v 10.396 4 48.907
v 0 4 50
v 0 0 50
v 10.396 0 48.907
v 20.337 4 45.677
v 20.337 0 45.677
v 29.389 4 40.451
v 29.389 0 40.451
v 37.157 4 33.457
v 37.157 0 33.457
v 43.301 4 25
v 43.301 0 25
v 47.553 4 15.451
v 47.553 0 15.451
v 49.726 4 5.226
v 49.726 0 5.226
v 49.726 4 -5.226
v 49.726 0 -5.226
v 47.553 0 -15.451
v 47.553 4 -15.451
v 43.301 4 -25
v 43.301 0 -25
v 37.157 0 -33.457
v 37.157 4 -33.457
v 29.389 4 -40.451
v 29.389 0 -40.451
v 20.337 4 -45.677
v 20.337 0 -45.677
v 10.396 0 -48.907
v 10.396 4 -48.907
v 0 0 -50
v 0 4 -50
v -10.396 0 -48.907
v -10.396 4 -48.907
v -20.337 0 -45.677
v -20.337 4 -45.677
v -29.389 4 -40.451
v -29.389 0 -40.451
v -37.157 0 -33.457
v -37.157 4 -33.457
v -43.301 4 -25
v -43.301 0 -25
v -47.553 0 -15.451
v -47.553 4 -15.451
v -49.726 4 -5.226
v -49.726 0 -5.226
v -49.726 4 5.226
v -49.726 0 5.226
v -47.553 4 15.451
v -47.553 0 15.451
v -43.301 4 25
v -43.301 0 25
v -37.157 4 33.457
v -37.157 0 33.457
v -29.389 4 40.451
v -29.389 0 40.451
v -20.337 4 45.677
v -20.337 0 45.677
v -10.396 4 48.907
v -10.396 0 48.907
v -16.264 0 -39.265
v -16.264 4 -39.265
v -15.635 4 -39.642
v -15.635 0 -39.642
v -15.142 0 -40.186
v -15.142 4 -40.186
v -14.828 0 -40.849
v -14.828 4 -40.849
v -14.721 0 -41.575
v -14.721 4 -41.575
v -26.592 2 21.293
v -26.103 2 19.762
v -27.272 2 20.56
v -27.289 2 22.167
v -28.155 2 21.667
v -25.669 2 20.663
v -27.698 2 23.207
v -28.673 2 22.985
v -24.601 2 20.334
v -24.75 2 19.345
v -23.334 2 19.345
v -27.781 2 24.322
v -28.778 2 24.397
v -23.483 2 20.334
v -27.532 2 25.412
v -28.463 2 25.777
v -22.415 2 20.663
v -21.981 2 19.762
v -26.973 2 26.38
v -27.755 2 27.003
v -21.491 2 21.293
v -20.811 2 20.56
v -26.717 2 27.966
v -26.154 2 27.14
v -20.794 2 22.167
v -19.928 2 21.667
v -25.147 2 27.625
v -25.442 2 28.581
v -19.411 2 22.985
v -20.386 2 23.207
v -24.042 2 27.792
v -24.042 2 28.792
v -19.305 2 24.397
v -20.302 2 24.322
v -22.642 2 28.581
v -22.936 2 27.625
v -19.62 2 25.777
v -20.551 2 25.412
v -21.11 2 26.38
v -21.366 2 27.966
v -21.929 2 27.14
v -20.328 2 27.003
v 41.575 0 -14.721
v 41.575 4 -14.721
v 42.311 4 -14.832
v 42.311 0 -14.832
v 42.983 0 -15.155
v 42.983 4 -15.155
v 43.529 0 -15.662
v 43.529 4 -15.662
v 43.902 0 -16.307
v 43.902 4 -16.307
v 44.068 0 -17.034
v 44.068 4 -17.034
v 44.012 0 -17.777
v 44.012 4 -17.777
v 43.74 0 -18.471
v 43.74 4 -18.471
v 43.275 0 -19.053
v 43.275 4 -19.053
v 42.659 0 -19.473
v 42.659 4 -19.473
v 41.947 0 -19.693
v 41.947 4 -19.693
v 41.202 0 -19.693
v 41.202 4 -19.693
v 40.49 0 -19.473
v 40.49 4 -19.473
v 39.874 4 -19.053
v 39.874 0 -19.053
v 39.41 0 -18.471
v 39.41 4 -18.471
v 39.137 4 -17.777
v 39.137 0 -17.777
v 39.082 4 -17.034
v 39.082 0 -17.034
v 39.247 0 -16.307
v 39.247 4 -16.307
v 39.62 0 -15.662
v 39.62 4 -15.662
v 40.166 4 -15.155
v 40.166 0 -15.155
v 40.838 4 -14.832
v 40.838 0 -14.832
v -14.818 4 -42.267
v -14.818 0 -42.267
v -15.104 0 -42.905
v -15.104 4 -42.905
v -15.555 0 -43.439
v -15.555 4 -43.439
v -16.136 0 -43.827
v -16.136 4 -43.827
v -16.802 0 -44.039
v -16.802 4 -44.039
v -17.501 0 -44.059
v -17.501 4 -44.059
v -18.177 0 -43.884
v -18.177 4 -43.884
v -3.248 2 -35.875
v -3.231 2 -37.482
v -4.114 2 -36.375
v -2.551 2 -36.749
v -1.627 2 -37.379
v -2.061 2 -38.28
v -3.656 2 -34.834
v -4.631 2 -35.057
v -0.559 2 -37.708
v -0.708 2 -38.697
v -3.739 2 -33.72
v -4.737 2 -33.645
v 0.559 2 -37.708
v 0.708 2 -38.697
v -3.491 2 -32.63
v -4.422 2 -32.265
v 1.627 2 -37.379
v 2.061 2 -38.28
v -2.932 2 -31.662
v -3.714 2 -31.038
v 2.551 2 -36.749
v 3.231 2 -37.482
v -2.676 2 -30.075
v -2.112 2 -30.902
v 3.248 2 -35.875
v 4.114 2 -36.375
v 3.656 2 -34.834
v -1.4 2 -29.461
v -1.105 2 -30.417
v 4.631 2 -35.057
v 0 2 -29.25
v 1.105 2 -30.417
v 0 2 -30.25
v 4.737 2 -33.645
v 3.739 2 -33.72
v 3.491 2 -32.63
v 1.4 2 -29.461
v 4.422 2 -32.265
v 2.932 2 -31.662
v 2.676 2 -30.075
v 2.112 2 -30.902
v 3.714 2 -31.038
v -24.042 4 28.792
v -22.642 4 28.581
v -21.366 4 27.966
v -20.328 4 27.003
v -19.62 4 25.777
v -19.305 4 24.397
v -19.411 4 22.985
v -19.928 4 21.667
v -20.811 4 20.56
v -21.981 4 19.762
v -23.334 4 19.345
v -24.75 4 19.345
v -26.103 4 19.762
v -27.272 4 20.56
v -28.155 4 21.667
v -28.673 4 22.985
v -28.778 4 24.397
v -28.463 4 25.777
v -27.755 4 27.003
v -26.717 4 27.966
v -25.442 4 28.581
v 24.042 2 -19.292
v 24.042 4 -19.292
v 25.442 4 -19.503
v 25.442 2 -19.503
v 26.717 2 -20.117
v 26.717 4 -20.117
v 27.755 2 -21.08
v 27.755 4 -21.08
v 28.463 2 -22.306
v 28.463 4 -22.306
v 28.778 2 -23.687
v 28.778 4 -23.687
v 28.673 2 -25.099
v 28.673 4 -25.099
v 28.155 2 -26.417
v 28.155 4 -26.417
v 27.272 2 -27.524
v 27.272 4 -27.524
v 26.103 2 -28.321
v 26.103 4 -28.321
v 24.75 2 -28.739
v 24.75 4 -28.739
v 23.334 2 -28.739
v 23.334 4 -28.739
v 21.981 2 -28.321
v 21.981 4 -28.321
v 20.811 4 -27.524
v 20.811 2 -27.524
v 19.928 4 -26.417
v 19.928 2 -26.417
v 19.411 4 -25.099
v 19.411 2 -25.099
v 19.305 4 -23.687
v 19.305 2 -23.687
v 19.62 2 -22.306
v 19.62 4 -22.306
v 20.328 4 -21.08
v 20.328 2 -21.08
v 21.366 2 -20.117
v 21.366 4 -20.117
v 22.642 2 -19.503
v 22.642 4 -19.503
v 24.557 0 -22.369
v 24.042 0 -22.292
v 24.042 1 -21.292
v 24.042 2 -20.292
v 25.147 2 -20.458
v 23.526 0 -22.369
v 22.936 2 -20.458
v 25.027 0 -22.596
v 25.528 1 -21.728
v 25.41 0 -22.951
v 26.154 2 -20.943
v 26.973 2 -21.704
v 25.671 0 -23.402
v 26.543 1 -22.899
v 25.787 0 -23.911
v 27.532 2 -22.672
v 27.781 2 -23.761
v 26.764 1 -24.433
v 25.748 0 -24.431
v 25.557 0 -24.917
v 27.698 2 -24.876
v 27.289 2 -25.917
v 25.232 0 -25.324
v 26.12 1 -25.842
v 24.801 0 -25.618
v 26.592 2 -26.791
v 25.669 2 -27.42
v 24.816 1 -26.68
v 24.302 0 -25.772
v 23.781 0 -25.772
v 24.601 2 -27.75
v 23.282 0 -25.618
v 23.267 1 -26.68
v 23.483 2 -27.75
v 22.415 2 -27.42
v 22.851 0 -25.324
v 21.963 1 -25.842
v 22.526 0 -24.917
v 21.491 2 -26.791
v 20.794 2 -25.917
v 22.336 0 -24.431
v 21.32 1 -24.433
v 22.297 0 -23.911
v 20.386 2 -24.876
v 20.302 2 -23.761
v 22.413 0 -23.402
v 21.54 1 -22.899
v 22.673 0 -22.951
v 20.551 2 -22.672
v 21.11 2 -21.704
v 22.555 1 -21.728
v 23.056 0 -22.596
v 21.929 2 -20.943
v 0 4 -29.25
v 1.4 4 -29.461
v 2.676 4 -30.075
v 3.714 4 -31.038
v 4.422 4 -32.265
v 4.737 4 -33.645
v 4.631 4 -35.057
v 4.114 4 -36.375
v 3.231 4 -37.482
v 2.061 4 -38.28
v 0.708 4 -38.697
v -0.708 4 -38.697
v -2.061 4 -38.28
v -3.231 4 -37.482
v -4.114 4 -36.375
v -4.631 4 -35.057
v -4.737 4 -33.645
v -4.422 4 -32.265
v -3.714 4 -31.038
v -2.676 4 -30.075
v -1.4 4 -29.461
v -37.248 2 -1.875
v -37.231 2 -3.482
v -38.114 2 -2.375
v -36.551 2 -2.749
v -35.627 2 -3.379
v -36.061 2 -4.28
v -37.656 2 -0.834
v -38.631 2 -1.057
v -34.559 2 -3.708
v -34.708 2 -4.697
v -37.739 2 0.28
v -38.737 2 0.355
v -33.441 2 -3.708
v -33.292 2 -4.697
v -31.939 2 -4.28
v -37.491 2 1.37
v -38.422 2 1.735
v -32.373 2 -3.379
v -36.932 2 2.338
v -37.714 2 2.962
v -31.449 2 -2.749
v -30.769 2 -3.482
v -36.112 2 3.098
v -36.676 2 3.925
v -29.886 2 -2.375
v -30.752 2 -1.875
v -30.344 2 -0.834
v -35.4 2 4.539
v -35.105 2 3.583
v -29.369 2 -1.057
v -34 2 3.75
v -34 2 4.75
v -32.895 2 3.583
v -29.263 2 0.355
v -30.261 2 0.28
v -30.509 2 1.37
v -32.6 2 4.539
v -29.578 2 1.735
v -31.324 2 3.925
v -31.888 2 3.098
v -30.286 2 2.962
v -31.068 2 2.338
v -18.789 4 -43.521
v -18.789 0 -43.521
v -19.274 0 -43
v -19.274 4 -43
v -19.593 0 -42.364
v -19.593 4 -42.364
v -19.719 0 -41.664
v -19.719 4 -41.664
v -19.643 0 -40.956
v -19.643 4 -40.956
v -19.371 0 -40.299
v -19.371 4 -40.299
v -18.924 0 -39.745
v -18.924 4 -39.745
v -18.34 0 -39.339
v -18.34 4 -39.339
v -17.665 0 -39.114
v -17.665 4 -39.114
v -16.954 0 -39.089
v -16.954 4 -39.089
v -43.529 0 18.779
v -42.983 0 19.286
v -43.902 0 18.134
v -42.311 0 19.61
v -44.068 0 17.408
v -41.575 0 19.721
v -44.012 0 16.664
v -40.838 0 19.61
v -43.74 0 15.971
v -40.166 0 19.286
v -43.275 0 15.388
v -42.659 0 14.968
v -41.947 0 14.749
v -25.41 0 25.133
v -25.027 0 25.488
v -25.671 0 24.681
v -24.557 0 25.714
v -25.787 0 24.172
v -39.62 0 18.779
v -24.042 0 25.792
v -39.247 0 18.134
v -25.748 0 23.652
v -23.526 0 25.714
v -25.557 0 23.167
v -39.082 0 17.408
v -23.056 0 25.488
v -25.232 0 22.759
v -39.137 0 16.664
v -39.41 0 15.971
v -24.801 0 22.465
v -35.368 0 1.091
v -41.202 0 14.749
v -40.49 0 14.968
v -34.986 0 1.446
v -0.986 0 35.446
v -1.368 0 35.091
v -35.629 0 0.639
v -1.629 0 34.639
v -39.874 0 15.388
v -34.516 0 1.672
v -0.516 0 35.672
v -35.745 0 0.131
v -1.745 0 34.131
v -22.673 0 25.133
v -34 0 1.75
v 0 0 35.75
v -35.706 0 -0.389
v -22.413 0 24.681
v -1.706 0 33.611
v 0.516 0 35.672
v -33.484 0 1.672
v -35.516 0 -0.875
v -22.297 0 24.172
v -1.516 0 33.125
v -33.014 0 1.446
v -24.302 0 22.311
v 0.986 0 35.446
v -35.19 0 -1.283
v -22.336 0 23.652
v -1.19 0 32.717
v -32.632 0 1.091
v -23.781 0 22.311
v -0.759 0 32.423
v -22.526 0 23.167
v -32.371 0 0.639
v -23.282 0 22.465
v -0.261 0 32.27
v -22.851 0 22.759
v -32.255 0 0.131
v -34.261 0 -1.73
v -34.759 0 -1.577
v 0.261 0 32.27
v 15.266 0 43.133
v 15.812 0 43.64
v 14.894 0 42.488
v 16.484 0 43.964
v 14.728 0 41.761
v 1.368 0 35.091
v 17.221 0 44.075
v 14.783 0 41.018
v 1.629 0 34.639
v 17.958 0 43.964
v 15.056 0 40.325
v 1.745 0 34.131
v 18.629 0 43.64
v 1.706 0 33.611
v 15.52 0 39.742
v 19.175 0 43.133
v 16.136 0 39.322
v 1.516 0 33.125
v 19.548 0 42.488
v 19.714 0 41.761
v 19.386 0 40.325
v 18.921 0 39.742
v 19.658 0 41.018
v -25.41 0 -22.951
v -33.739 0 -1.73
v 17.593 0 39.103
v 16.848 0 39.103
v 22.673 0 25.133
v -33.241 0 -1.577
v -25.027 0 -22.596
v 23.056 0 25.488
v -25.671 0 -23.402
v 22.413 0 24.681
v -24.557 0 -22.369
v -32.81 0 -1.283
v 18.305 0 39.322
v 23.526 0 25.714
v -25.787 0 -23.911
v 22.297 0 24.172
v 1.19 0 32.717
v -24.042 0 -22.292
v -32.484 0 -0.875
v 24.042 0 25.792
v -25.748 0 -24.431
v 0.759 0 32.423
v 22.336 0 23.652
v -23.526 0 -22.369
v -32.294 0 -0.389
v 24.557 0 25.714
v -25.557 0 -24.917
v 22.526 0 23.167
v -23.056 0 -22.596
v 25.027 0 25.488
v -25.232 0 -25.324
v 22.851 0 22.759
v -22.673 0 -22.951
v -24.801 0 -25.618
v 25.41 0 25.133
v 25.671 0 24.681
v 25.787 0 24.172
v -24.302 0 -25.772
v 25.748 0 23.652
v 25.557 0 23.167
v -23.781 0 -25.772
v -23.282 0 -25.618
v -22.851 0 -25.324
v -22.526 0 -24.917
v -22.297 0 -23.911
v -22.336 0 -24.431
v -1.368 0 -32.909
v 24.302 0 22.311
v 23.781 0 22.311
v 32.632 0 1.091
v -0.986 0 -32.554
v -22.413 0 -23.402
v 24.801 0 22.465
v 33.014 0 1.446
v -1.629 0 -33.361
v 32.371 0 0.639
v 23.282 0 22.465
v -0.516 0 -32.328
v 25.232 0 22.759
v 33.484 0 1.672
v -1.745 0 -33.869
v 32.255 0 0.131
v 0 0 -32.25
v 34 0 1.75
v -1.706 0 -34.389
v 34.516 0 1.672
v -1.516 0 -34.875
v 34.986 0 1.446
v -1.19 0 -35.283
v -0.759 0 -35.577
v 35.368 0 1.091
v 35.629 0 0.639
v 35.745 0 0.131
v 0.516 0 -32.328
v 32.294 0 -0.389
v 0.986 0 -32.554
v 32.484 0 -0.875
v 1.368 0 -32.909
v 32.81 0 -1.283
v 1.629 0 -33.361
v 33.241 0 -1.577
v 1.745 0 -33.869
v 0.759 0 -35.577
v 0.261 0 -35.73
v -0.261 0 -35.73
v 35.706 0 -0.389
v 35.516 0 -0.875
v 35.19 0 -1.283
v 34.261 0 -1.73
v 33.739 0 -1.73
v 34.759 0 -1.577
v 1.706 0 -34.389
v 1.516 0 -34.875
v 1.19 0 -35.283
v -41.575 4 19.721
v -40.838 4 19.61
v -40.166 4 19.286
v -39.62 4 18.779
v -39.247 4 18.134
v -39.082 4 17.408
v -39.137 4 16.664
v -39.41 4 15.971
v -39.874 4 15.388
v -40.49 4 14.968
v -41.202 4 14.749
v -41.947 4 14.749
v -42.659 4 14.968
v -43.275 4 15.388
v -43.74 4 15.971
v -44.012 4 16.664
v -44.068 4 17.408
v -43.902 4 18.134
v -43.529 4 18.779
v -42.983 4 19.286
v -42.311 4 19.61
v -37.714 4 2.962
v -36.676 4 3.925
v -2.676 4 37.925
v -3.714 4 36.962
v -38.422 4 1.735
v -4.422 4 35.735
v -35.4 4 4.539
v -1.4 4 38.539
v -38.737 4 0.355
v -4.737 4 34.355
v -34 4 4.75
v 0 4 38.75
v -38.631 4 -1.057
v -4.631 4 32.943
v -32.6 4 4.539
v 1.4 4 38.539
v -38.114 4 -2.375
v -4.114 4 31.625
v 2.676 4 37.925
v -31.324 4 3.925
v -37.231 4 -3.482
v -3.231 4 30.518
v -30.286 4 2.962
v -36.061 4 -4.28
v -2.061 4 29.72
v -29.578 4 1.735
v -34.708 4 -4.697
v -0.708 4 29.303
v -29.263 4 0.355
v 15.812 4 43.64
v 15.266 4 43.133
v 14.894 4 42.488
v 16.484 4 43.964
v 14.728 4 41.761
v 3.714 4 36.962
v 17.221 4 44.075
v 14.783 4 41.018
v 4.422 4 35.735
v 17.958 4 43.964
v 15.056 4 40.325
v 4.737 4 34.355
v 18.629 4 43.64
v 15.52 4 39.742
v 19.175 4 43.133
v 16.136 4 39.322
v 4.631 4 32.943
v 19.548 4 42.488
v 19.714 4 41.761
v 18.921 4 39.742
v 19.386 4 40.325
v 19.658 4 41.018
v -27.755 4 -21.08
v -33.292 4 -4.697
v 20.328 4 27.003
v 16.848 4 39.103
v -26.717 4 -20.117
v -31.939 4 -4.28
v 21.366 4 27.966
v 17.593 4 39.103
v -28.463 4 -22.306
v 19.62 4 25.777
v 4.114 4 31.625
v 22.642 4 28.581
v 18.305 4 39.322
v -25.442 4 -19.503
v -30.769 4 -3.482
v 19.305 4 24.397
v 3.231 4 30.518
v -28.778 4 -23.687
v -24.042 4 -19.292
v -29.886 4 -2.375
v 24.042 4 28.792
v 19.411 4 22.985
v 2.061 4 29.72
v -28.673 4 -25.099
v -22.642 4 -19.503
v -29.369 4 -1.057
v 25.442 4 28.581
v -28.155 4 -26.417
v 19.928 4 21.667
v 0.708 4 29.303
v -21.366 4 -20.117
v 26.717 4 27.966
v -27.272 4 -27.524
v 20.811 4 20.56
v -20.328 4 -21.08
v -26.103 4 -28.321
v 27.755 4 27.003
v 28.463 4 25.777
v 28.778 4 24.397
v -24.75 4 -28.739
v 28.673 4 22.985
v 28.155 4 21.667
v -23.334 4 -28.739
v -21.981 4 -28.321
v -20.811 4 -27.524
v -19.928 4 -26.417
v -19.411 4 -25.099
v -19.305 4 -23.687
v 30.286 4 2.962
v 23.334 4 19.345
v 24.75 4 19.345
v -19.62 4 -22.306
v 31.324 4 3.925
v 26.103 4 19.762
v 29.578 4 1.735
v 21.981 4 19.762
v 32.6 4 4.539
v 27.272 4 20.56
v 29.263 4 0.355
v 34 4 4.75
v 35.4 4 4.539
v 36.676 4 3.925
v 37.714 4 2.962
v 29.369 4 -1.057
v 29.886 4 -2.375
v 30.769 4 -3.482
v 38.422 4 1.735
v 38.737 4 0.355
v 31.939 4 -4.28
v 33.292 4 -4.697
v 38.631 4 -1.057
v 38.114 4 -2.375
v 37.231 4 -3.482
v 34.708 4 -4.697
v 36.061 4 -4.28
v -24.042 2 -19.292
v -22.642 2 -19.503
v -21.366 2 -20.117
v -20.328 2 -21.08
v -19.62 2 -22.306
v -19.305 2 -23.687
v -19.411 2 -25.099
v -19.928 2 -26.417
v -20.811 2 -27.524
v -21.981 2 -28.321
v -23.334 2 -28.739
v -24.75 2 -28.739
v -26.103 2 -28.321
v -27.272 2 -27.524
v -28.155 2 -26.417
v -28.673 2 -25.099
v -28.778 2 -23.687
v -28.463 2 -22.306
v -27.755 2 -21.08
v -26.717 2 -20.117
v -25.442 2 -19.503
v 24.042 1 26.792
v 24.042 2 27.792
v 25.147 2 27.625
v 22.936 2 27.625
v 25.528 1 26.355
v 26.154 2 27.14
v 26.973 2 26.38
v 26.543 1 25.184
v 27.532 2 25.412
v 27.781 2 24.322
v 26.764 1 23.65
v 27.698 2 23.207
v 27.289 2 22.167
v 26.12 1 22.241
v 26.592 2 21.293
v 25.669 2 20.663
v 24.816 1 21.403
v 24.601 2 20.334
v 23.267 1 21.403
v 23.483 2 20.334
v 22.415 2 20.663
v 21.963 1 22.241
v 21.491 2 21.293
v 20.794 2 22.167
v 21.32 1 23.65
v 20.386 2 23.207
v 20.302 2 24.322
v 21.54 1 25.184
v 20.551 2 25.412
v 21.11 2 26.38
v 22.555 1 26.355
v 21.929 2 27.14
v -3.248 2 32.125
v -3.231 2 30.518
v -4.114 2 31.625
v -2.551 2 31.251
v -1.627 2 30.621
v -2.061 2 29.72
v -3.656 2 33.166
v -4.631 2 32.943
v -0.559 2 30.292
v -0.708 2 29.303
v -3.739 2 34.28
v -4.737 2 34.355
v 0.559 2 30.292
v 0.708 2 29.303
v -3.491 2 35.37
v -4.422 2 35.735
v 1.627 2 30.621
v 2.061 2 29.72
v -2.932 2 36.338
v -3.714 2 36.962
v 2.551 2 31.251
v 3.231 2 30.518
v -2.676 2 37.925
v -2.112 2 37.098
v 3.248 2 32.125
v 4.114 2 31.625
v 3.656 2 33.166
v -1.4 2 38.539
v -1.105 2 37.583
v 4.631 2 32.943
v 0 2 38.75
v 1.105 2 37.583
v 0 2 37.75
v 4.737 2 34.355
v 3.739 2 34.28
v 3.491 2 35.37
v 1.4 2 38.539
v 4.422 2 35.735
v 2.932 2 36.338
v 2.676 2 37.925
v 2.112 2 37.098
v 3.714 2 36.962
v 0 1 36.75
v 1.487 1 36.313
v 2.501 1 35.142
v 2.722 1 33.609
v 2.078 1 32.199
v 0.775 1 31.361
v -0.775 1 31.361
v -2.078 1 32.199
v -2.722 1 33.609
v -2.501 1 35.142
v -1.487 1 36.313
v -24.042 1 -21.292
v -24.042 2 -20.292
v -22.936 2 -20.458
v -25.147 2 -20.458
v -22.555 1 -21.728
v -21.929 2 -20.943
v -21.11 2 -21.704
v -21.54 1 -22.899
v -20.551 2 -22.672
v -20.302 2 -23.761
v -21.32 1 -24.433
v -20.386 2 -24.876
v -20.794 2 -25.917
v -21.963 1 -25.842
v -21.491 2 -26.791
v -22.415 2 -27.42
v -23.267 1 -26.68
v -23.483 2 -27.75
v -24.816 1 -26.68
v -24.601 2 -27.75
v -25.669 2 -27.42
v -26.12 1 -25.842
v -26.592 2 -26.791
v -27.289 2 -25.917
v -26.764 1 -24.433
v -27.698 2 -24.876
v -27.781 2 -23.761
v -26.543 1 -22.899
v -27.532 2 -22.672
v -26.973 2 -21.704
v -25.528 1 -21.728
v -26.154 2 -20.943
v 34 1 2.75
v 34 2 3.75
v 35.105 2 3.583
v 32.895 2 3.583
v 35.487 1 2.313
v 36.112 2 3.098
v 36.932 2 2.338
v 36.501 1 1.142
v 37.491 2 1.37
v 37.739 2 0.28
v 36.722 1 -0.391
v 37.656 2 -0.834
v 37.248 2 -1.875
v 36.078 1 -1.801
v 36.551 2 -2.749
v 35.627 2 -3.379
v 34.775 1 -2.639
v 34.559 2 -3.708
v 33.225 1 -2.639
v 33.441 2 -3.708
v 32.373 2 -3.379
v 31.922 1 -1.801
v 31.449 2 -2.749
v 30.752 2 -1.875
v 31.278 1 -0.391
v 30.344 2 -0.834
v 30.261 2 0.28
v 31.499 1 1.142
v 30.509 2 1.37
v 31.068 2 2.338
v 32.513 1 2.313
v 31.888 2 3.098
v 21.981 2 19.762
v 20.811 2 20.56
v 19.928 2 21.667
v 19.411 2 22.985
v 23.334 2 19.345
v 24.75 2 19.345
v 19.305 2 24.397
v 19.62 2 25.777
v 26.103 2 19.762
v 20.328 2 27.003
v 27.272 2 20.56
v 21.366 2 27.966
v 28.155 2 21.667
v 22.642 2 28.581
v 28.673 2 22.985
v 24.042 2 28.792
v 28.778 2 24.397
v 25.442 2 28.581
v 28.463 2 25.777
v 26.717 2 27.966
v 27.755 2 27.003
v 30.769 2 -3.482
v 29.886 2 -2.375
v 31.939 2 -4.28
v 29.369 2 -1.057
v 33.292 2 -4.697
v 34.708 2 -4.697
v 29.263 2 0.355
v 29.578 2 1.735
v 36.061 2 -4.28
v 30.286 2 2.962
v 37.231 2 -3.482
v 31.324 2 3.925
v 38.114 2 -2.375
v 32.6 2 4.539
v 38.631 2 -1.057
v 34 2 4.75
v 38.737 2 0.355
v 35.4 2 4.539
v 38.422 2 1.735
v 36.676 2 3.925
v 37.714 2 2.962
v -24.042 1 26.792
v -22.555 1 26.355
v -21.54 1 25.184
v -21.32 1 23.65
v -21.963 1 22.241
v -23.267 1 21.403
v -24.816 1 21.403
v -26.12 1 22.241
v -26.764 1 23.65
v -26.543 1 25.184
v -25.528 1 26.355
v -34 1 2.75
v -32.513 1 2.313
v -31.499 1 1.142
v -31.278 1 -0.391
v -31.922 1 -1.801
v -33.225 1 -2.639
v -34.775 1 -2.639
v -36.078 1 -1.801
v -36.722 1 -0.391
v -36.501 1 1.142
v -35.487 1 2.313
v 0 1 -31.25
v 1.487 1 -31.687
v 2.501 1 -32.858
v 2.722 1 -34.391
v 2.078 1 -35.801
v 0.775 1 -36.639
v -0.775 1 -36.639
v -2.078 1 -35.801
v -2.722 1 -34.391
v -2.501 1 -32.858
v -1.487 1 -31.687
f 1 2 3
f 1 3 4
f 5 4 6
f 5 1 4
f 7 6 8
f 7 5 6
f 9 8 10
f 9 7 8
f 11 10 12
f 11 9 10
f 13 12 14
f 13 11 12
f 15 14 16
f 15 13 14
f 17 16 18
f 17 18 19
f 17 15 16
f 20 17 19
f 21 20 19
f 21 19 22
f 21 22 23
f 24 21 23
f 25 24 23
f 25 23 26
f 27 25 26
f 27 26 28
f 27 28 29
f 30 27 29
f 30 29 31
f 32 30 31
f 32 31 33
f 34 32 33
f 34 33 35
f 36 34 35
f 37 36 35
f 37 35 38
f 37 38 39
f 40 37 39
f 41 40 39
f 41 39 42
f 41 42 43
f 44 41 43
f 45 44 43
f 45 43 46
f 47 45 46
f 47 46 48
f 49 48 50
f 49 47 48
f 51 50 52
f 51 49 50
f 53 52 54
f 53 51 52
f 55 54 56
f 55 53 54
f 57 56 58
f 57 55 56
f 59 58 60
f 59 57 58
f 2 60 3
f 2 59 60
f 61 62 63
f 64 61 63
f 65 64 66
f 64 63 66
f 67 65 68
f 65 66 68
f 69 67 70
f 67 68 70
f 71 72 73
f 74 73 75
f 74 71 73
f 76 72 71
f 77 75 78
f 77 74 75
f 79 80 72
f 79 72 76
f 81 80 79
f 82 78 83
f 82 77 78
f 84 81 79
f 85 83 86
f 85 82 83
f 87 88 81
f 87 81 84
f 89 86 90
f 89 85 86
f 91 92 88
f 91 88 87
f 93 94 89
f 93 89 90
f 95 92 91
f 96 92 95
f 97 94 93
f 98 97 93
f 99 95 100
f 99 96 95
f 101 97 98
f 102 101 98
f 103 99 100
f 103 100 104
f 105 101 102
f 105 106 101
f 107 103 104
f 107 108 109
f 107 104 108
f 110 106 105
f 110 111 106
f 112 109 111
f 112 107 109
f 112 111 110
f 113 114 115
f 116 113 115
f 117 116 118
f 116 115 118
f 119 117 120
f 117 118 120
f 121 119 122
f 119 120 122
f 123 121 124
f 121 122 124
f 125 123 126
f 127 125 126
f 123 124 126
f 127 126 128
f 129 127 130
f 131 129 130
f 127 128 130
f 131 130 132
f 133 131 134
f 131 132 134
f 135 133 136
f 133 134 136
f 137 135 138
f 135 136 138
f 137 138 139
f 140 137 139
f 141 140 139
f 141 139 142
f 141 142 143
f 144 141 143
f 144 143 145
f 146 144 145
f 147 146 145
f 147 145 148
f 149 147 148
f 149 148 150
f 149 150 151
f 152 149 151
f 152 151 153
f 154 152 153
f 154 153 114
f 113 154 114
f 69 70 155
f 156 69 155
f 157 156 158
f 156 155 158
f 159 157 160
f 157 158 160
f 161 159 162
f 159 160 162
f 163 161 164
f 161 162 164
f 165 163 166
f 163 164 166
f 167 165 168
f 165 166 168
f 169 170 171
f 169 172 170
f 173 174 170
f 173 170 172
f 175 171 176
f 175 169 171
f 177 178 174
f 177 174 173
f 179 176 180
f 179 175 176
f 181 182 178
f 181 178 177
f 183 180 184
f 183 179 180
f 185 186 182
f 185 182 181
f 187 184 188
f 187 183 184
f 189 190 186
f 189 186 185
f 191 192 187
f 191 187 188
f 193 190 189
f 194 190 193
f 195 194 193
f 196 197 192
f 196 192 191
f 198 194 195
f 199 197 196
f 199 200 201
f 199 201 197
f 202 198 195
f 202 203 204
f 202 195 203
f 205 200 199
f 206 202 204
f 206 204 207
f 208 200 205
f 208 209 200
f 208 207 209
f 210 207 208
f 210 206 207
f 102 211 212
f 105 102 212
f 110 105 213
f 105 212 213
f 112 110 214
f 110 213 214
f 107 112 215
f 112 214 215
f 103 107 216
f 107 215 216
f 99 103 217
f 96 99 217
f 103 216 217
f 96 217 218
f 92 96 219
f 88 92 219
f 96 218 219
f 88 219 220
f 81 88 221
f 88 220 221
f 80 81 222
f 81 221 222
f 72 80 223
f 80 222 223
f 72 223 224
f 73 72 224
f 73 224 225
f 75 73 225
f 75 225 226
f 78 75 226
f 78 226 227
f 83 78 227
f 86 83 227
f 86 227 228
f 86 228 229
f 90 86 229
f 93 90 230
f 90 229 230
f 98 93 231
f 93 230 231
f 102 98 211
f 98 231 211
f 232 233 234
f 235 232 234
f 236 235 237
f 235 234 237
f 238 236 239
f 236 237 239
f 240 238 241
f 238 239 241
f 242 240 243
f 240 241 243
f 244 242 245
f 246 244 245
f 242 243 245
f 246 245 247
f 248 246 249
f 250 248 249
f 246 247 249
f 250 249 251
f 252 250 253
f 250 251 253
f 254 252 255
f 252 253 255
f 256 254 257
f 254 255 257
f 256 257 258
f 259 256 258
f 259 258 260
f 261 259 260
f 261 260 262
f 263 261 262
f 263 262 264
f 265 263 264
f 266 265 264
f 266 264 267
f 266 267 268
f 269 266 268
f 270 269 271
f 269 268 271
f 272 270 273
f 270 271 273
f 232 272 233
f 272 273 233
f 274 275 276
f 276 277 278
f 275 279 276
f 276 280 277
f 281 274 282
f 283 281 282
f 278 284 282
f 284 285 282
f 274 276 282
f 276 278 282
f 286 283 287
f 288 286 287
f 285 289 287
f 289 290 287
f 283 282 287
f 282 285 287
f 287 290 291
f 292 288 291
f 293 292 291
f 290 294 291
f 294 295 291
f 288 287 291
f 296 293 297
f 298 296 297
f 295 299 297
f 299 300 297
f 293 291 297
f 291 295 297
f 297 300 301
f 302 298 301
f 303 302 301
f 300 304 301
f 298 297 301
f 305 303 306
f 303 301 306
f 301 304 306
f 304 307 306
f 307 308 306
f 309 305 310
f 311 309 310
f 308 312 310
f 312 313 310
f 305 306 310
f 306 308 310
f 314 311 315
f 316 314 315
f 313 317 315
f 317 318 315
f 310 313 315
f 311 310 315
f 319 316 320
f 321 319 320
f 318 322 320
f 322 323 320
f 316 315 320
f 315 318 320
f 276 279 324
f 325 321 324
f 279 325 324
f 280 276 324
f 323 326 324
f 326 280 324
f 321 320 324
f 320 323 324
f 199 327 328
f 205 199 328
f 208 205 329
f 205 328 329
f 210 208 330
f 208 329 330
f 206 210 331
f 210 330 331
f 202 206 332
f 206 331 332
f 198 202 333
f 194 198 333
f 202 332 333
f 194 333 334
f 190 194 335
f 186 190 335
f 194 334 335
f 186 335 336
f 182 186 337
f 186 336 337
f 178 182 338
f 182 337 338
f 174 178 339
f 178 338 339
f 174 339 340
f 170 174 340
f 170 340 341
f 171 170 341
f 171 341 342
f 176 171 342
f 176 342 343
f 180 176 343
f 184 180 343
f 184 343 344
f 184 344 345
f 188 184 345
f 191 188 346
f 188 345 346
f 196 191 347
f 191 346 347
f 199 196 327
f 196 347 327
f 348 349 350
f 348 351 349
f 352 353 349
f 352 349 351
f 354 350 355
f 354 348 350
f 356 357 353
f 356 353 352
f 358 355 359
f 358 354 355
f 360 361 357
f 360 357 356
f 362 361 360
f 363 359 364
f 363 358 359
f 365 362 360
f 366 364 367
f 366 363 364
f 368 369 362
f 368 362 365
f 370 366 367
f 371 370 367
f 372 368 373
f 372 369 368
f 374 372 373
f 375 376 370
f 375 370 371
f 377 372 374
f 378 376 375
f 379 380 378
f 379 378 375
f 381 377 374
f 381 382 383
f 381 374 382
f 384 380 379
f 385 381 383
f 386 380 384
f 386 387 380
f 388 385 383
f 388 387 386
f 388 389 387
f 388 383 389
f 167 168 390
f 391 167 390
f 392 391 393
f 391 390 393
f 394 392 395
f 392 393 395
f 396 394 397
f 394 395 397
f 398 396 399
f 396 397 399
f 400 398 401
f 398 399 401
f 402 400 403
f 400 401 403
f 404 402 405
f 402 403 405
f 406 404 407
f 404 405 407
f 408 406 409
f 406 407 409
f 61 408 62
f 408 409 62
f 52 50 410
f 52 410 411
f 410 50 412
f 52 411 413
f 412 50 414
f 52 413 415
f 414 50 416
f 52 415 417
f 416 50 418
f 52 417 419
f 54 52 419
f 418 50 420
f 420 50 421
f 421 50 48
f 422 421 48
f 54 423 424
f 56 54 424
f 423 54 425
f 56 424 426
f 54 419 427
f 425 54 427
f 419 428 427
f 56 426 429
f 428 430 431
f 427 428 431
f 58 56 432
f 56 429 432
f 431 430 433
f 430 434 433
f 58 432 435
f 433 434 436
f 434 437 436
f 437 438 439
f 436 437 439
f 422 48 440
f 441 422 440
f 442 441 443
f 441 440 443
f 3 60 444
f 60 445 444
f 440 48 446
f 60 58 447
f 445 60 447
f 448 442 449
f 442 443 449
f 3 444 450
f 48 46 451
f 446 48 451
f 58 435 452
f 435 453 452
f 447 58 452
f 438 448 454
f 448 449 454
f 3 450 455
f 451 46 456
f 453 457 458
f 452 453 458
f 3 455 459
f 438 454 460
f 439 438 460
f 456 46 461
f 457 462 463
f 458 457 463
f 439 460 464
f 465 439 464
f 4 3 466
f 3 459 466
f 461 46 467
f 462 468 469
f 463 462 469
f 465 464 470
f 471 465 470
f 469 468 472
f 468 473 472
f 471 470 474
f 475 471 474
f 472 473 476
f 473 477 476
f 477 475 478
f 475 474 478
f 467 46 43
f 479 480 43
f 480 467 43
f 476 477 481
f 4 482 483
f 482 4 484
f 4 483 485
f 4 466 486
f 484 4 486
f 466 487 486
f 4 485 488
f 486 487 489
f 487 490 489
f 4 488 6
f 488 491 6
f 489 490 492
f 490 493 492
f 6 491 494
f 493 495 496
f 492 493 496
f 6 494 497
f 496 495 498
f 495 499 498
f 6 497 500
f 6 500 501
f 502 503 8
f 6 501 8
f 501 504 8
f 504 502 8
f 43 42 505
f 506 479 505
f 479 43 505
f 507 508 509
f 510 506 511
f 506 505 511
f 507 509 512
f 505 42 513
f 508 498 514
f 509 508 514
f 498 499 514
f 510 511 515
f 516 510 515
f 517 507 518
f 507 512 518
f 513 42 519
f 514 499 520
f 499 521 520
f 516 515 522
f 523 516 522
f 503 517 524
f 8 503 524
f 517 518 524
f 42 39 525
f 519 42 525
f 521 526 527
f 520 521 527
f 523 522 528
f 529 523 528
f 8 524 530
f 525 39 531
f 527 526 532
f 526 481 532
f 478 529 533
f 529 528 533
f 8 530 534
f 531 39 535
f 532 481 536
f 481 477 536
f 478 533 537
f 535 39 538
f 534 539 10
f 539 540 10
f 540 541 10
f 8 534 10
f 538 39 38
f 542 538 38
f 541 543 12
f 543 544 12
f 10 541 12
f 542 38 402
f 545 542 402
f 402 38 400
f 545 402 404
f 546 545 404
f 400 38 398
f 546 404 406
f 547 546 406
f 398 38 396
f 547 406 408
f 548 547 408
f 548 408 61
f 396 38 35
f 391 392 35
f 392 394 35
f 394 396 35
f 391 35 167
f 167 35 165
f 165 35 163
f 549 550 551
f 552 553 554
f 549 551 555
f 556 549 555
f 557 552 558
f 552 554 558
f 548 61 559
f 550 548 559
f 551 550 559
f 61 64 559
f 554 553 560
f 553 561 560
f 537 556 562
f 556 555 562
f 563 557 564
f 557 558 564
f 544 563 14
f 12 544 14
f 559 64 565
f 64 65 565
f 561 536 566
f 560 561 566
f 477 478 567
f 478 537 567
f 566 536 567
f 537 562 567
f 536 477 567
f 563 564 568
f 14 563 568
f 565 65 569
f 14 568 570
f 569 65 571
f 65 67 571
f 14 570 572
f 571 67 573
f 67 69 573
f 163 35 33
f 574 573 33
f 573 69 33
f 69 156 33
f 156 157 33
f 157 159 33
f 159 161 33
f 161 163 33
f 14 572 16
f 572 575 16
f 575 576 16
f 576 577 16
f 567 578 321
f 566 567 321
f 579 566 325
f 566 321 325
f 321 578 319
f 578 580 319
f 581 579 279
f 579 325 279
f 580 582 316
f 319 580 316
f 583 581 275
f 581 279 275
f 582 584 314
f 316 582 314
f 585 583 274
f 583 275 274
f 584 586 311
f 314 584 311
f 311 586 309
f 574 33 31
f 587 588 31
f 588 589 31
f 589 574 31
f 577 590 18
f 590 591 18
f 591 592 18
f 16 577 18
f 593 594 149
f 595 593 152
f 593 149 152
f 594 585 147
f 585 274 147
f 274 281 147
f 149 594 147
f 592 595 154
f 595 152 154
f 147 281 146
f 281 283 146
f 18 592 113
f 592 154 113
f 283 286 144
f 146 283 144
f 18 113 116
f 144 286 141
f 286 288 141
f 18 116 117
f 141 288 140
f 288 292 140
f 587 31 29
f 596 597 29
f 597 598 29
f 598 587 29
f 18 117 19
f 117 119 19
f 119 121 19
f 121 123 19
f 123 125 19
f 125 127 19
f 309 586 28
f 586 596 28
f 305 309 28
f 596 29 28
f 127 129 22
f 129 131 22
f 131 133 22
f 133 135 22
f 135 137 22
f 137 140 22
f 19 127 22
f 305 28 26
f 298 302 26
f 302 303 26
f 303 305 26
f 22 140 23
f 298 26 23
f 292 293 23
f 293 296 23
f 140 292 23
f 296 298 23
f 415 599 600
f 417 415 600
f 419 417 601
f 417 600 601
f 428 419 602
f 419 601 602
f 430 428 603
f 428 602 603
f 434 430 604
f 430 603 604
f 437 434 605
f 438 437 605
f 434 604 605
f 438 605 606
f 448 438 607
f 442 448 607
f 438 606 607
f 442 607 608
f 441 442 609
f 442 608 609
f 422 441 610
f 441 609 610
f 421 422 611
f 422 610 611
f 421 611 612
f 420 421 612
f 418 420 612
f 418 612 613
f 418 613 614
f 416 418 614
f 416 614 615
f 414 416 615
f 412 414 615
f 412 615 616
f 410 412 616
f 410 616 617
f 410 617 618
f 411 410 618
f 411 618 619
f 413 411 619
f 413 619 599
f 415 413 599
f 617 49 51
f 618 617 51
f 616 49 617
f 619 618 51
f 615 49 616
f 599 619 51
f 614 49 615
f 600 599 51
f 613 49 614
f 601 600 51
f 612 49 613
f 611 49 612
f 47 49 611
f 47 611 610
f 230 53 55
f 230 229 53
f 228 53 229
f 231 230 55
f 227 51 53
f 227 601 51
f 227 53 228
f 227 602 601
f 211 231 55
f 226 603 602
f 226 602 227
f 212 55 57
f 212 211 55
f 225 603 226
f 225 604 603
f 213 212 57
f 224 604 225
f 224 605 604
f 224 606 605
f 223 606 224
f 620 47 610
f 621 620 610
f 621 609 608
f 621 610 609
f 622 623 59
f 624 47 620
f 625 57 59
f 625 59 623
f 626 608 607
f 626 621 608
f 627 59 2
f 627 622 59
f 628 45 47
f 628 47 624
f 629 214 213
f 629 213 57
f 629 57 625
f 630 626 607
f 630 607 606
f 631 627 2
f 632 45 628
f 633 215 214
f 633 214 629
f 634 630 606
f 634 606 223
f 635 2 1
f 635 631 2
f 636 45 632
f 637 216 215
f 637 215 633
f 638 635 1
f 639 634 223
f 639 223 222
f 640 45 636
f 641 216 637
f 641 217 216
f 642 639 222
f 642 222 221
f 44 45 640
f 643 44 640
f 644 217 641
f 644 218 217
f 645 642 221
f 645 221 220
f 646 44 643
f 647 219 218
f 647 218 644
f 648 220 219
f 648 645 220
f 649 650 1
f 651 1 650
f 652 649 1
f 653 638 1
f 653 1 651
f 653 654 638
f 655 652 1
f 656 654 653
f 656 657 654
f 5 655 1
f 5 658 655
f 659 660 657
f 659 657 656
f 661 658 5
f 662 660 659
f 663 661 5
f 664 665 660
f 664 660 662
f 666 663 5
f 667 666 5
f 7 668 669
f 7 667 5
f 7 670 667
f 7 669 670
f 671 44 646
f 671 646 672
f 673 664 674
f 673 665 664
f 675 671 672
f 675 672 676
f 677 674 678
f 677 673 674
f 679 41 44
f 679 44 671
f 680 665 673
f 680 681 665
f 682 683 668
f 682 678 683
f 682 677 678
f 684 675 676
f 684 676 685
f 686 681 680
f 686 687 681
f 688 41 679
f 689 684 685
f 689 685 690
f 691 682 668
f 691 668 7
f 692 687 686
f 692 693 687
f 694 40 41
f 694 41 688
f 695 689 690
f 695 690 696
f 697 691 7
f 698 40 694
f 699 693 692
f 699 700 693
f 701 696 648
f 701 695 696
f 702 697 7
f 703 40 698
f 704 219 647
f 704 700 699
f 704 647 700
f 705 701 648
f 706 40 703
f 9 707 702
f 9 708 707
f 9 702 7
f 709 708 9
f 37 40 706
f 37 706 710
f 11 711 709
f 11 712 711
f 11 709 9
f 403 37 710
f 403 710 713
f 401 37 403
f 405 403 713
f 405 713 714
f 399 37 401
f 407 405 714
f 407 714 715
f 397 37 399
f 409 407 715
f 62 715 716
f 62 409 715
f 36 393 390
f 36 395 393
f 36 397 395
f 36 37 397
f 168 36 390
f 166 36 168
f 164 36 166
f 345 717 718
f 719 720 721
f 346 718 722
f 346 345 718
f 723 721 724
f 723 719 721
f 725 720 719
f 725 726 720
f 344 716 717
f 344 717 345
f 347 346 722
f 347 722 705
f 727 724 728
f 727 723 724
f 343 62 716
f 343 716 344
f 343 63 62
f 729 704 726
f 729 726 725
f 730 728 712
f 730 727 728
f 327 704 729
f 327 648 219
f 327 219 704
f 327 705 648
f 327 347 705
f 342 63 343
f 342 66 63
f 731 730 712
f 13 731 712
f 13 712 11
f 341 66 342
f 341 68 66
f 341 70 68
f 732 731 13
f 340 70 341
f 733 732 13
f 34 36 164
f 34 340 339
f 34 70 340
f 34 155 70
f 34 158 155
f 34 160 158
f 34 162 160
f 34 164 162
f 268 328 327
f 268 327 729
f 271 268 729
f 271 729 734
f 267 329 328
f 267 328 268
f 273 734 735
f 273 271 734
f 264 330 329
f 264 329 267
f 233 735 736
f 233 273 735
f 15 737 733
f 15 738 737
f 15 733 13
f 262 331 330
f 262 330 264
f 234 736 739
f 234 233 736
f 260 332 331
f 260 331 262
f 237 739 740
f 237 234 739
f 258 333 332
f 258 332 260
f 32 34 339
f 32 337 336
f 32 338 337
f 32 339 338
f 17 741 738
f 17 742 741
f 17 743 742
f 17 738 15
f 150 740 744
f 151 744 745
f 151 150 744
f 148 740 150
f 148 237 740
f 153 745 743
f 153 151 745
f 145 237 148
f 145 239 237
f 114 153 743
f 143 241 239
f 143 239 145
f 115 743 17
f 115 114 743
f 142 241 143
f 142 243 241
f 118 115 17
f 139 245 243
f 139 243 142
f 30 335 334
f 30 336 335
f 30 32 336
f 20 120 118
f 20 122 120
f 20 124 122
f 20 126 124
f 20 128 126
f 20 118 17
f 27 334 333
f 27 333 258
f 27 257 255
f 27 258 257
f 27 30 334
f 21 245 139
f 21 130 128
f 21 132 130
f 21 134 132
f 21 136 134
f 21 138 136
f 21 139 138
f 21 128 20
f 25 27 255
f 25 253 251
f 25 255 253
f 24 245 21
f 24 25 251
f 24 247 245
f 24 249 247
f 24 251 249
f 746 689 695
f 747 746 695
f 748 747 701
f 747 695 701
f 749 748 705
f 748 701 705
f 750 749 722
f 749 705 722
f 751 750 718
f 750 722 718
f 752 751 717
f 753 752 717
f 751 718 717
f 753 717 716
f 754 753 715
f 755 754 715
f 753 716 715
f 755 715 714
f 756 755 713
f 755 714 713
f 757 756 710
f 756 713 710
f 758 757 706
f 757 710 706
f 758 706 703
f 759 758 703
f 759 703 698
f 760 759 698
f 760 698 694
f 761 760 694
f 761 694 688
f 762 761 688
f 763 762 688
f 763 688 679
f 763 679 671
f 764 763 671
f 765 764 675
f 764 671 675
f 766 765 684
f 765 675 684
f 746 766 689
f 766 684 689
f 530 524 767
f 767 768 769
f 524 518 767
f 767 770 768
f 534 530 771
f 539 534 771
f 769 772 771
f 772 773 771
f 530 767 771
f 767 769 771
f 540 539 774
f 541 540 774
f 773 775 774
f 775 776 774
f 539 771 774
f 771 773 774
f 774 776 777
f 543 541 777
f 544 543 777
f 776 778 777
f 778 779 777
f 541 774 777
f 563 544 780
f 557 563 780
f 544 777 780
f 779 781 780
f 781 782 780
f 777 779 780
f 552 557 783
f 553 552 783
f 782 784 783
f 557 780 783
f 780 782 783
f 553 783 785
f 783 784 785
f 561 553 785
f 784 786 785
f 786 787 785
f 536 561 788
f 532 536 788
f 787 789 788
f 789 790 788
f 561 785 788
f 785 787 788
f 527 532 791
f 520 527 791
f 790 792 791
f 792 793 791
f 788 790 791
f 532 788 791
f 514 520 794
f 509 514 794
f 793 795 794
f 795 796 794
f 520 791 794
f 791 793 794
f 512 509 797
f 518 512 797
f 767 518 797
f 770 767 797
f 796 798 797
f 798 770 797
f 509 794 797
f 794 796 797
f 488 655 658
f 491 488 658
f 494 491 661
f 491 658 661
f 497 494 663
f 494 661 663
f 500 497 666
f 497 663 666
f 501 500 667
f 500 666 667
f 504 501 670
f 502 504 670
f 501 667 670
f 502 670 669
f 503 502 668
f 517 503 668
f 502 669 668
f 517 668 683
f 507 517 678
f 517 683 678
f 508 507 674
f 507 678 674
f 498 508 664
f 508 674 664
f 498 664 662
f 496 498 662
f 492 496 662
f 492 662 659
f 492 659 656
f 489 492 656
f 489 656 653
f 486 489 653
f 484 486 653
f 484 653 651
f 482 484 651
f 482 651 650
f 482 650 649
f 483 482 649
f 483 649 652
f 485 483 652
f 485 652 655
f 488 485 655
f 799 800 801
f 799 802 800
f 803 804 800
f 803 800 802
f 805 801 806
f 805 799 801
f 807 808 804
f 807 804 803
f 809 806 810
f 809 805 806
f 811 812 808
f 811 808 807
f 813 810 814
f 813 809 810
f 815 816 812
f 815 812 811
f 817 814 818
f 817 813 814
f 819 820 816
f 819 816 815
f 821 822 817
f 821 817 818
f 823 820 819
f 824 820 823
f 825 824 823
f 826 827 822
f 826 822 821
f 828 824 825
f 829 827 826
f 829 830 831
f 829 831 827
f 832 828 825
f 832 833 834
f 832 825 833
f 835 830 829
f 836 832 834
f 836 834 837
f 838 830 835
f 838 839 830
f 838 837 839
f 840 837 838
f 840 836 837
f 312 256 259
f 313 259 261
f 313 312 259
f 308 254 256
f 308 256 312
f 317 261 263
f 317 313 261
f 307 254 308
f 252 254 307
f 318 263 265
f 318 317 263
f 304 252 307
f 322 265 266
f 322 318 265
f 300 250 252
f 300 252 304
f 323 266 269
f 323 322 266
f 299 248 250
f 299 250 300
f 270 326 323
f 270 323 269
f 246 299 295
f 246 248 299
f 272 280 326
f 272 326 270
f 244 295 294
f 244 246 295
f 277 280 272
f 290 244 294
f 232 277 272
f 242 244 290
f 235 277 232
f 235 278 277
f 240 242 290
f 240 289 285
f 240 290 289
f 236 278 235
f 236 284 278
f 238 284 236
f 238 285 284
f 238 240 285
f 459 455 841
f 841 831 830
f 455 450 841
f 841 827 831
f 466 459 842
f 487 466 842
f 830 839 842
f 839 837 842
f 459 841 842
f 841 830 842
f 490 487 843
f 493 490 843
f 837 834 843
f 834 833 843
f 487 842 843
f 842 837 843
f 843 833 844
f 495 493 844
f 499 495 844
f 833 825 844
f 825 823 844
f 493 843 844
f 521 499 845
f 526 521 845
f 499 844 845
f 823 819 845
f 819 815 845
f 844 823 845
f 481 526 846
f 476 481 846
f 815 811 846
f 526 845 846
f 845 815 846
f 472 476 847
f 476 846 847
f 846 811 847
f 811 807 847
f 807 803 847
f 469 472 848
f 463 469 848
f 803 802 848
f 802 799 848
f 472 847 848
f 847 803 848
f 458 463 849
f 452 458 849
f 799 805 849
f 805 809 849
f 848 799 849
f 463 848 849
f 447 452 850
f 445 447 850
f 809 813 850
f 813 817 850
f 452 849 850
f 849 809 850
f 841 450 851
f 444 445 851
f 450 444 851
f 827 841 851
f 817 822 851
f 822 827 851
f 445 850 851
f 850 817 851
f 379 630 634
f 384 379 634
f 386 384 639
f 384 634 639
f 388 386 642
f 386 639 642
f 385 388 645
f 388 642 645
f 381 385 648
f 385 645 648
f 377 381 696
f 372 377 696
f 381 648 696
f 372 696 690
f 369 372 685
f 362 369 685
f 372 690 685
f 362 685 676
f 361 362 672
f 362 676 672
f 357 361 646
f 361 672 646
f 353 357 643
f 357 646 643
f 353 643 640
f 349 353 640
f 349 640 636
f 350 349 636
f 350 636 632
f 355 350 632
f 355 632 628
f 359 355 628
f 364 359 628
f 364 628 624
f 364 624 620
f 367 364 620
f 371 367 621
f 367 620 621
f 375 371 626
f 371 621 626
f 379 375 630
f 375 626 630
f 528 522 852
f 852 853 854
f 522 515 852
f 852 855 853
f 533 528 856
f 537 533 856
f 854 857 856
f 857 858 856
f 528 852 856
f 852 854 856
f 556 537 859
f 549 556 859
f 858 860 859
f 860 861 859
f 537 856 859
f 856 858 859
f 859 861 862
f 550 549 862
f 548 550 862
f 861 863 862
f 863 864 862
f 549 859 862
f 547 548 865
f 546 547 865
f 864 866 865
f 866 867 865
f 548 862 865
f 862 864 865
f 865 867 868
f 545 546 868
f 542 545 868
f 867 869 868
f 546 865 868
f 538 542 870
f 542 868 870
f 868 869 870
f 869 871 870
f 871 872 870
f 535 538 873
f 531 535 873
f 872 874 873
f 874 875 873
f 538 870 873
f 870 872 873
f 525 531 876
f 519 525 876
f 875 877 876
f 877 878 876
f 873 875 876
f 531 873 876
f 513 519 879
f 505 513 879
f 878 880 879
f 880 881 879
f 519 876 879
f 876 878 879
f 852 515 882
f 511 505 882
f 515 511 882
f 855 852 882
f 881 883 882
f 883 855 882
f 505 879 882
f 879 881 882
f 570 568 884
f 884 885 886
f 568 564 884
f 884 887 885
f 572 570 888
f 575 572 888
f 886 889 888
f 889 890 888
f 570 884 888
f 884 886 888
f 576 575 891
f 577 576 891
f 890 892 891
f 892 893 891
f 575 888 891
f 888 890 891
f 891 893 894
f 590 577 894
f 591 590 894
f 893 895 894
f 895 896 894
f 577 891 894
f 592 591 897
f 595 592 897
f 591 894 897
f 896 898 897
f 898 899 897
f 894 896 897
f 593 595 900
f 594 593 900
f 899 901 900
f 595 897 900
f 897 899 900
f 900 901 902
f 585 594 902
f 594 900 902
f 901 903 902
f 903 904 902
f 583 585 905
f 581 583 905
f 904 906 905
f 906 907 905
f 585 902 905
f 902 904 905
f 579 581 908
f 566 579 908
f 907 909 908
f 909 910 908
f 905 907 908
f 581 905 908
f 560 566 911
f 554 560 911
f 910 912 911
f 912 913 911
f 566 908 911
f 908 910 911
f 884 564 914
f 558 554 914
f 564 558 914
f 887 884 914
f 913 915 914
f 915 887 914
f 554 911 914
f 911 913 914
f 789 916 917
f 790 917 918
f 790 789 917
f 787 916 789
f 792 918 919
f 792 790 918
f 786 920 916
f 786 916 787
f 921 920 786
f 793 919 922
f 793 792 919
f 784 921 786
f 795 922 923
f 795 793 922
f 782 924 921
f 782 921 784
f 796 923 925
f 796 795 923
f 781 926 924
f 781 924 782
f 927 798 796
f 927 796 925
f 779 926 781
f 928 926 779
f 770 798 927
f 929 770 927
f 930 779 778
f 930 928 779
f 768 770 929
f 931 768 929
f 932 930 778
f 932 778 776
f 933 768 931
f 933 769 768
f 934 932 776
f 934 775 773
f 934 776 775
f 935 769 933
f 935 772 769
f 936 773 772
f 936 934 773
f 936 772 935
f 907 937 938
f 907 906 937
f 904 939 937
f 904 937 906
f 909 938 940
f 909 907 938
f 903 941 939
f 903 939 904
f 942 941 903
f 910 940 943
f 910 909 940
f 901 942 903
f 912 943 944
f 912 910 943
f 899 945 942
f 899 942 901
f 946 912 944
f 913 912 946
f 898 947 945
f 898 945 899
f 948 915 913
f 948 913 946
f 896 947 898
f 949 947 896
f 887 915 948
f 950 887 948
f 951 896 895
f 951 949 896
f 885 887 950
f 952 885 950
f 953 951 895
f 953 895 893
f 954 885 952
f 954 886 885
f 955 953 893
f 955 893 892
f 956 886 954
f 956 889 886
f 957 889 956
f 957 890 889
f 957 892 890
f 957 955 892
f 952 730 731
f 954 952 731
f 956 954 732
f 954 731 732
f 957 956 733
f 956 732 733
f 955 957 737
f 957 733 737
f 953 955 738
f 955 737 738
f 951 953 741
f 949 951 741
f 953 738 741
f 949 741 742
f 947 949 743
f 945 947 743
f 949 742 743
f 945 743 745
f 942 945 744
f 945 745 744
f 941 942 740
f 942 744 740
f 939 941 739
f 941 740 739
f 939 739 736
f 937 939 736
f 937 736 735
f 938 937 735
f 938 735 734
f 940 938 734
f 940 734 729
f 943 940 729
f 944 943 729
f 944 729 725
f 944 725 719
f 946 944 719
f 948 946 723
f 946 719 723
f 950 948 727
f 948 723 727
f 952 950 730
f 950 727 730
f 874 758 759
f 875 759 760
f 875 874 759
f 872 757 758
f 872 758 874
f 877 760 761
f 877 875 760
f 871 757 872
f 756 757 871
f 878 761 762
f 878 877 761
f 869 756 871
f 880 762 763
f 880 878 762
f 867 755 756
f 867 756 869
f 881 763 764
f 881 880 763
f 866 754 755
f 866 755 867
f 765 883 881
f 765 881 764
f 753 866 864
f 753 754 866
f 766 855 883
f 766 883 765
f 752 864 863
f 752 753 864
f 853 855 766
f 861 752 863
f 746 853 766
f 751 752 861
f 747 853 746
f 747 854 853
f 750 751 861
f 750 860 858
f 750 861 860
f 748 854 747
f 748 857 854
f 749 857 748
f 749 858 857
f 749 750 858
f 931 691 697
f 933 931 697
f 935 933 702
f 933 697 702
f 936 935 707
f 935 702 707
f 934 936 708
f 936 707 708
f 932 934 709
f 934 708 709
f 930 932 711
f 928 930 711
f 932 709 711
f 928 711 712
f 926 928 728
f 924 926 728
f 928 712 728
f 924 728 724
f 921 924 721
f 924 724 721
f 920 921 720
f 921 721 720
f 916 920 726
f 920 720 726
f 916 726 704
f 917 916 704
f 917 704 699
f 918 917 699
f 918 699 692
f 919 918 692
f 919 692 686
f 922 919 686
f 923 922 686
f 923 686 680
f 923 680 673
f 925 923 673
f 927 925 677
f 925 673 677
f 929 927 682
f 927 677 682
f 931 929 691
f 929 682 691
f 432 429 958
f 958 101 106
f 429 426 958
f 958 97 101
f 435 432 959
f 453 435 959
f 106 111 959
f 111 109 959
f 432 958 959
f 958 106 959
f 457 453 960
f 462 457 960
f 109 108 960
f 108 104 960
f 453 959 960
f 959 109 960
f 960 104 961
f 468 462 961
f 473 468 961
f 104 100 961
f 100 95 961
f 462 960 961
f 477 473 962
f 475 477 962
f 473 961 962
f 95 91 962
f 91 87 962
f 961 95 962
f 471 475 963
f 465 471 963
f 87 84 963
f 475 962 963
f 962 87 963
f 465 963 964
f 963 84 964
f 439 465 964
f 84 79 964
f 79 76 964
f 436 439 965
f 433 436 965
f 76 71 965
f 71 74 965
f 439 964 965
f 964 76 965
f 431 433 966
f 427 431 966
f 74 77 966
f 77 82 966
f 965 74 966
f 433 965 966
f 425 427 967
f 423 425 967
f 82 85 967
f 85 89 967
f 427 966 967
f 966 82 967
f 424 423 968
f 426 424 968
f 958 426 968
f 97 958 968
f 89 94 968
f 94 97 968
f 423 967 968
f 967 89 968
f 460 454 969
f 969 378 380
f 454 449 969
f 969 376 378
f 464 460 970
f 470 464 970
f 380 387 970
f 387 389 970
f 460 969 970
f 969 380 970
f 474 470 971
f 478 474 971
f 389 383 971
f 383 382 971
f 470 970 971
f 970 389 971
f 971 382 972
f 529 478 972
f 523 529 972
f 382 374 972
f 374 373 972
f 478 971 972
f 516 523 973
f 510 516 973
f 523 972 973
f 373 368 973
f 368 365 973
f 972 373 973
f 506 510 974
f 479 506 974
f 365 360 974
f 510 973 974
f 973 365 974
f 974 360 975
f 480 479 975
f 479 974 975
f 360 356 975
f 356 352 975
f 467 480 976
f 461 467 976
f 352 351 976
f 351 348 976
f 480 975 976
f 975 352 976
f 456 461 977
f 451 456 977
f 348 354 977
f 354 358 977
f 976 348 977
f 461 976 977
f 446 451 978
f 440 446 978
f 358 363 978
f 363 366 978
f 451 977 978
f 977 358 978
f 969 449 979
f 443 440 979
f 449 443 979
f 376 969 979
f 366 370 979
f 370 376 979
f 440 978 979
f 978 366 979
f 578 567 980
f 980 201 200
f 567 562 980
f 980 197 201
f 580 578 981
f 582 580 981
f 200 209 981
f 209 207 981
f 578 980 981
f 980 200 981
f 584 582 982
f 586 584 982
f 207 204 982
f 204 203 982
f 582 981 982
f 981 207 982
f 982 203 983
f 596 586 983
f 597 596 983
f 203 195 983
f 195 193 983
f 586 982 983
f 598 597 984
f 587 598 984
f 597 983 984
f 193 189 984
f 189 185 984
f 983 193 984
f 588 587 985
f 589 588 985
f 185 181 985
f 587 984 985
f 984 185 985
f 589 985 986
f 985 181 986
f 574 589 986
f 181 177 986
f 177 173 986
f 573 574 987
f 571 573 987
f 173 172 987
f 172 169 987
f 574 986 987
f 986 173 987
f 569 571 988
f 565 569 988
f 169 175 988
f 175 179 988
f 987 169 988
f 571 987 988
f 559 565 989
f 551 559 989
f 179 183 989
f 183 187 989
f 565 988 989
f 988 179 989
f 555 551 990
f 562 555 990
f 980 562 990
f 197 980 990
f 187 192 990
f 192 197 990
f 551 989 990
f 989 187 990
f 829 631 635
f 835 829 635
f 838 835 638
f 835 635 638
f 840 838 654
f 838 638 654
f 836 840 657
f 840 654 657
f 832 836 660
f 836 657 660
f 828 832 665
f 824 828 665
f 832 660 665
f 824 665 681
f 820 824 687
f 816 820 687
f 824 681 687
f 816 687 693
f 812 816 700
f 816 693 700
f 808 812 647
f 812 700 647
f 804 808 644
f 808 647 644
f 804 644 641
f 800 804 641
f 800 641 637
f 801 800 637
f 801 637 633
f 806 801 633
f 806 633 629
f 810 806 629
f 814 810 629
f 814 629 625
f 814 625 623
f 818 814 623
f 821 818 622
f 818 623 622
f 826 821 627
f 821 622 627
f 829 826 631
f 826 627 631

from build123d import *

# Parameters (mm, degrees)
SKETCH1_W           = 100
SKETCH1_H           = 100
BOSS_EXTRUDE1_DEPTH = 4
SKETCH2_R           = 1.75
CUT_EXTRUDE1_DEPTH  = 10
SKETCH3_OUTSIDE_W   = 130.296
SKETCH3_OUTSIDE_H   = 130.296
SKETCH3_OUTSIDE_R   = 50
CUT_EXTRUDE2_DEPTH  = 10
SKETCH4_R           = 2.5
CUT_EXTRUDE3_DEPTH  = 10
SKETCH5_R           = 4.75
CUT_EXTRUDE4_DEPTH  = 2
CHAMFER1_SIZE       = 2


with BuildPart() as part:
    # Sketch1 → Boss-Extrude1 (new body)
    with BuildSketch(Plane(origin=(0, 0, 0), x_dir=(1, 0, 0), z_dir=(0, 1, 0))):
        Rectangle(SKETCH1_W, SKETCH1_H)
    extrude(amount=BOSS_EXTRUDE1_DEPTH)

    # Sketch2 → Cut-Extrude1 (cut)
    with BuildSketch(Plane(origin=(0, 4, 0), x_dir=(1, 0, 0), z_dir=(0, 1, 0))):
        with Locations(Location((-34, 0, 0), (0, 0, 270))):
            Circle(SKETCH2_R)
        with Locations(Location((-24.04163056, 24.04163056, 0), (0, 0, 270))):
            Circle(SKETCH2_R)
        with Locations(Location((0, 34, 0), (0, 0, 270))):
            Circle(SKETCH2_R)
        with Locations(Location((24.04163056, 24.04163056, 0), (0, 0, 270))):
            Circle(SKETCH2_R)
        with Locations(Location((34, 0, 0), (0, 0, 270))):
            Circle(SKETCH2_R)
        with Locations(Location((24.04163056, -24.04163056, 0), (0, 0, 270))):
            Circle(SKETCH2_R)
        with Locations(Location((0, -34, 0), (0, 0, 270))):
            Circle(SKETCH2_R)
        with Locations(Location((-24.04163056, -24.04163056, 0), (0, 0, 270))):
            Circle(SKETCH2_R)
    extrude(amount=-CUT_EXTRUDE1_DEPTH, mode=Mode.SUBTRACT)

    # Sketch3 outside → Cut-Extrude2 (cut)
    with BuildSketch(Plane(origin=(0, 4, 0), x_dir=(1, 0, 0), z_dir=(0, 1, 0))):
        Rectangle(SKETCH3_OUTSIDE_W, SKETCH3_OUTSIDE_H)
        with Locations(Location((0, 0, 0), (0, 0, 270))):
            Circle(SKETCH3_OUTSIDE_R, mode=Mode.SUBTRACT)
    extrude(amount=-CUT_EXTRUDE2_DEPTH, mode=Mode.SUBTRACT)

    # Sketch4 → Cut-Extrude3 (cut)
    with BuildSketch(Plane(origin=(0, 4, 0), x_dir=(1, 0, 0), z_dir=(0, 1, 0))):
        with BuildLine():
            ThreePointArc((-18.177463037, 43.884277794), (-19.530453288, 40.617870382), (-16.264045876, 39.264880132))
            Line((-16.264045876, 39.264880132), (-18.177463037, 43.884277794))
        make_face()
        with BuildLine():
            Line((-18.177463037, 43.884277794), (-16.264045876, 39.264880132))
            ThreePointArc((-16.264045876, 39.264880132), (-15.142080426, 40.18565338), (-14.720754456, 41.574578963))
            ThreePointArc((-14.720754456, 41.574578963), (-15.831828874, 43.653252994), (-18.177463037, 43.884277794))
        make_face()
        with Locations(Location((41.574578963, 17.220754456, 0), (0, 0, 270))):
            Circle(SKETCH4_R)
        with Locations(Location((-41.574578963, -17.220754456, 0), (0, 0, 270))):
            Circle(SKETCH4_R)
        with Locations(Location((17.220754456, -41.574578963, 0), (0, 0, 270))):
            Circle(SKETCH4_R)
    extrude(amount=-CUT_EXTRUDE3_DEPTH, mode=Mode.SUBTRACT)

    # Sketch5 → Cut-Extrude4 (cut)
    with BuildSketch(Plane(origin=(0, 4, 0), x_dir=(1, 0, 0), z_dir=(0, 1, 0))):
        with Locations(Location((0, -34, 0), (0, 0, 270))):
            Circle(SKETCH5_R)
        with Locations(Location((24.04163056, -24.04163056, 0), (0, 0, 270))):
            Circle(SKETCH5_R)
        with Locations(Location((34, 0, 0), (0, 0, 270))):
            Circle(SKETCH5_R)
        with Locations(Location((24.04163056, 24.04163056, 0), (0, 0, 270))):
            Circle(SKETCH5_R)
        with Locations(Location((-24.04163056, -24.04163056, 0), (0, 0, 270))):
            Circle(SKETCH5_R)
        with Locations(Location((-34, 0, 0), (0, 0, 270))):
            Circle(SKETCH5_R)
        with Locations(Location((-24.04163056, 24.04163056, 0), (0, 0, 270))):
            Circle(SKETCH5_R)
        with Locations(Location((0, 34, 0), (0, 0, 270))):
            Circle(SKETCH5_R)
    extrude(amount=-CUT_EXTRUDE4_DEPTH, mode=Mode.SUBTRACT)

    # Chamfer1
    chamfer1_edges = [part.edges().sort_by_distance(p)[0] for p in [
        (0, 2, 32.25),
        (0, 2, -35.75),
        (-24.04163056, 2, -25.79163056),
        (-34, 2, -1.75),
        (24.04163056, 2, 22.29163056),
        (34, 2, -1.75),
        (24.04163056, 2, -25.79163056),
        (-24.04163056, 2, 22.29163056),
    ]]
    chamfer(chamfer1_edges, length=CHAMFER1_SIZE - 0.0001)  # a hair under: the kernel refuses the full size


solid = part.part
